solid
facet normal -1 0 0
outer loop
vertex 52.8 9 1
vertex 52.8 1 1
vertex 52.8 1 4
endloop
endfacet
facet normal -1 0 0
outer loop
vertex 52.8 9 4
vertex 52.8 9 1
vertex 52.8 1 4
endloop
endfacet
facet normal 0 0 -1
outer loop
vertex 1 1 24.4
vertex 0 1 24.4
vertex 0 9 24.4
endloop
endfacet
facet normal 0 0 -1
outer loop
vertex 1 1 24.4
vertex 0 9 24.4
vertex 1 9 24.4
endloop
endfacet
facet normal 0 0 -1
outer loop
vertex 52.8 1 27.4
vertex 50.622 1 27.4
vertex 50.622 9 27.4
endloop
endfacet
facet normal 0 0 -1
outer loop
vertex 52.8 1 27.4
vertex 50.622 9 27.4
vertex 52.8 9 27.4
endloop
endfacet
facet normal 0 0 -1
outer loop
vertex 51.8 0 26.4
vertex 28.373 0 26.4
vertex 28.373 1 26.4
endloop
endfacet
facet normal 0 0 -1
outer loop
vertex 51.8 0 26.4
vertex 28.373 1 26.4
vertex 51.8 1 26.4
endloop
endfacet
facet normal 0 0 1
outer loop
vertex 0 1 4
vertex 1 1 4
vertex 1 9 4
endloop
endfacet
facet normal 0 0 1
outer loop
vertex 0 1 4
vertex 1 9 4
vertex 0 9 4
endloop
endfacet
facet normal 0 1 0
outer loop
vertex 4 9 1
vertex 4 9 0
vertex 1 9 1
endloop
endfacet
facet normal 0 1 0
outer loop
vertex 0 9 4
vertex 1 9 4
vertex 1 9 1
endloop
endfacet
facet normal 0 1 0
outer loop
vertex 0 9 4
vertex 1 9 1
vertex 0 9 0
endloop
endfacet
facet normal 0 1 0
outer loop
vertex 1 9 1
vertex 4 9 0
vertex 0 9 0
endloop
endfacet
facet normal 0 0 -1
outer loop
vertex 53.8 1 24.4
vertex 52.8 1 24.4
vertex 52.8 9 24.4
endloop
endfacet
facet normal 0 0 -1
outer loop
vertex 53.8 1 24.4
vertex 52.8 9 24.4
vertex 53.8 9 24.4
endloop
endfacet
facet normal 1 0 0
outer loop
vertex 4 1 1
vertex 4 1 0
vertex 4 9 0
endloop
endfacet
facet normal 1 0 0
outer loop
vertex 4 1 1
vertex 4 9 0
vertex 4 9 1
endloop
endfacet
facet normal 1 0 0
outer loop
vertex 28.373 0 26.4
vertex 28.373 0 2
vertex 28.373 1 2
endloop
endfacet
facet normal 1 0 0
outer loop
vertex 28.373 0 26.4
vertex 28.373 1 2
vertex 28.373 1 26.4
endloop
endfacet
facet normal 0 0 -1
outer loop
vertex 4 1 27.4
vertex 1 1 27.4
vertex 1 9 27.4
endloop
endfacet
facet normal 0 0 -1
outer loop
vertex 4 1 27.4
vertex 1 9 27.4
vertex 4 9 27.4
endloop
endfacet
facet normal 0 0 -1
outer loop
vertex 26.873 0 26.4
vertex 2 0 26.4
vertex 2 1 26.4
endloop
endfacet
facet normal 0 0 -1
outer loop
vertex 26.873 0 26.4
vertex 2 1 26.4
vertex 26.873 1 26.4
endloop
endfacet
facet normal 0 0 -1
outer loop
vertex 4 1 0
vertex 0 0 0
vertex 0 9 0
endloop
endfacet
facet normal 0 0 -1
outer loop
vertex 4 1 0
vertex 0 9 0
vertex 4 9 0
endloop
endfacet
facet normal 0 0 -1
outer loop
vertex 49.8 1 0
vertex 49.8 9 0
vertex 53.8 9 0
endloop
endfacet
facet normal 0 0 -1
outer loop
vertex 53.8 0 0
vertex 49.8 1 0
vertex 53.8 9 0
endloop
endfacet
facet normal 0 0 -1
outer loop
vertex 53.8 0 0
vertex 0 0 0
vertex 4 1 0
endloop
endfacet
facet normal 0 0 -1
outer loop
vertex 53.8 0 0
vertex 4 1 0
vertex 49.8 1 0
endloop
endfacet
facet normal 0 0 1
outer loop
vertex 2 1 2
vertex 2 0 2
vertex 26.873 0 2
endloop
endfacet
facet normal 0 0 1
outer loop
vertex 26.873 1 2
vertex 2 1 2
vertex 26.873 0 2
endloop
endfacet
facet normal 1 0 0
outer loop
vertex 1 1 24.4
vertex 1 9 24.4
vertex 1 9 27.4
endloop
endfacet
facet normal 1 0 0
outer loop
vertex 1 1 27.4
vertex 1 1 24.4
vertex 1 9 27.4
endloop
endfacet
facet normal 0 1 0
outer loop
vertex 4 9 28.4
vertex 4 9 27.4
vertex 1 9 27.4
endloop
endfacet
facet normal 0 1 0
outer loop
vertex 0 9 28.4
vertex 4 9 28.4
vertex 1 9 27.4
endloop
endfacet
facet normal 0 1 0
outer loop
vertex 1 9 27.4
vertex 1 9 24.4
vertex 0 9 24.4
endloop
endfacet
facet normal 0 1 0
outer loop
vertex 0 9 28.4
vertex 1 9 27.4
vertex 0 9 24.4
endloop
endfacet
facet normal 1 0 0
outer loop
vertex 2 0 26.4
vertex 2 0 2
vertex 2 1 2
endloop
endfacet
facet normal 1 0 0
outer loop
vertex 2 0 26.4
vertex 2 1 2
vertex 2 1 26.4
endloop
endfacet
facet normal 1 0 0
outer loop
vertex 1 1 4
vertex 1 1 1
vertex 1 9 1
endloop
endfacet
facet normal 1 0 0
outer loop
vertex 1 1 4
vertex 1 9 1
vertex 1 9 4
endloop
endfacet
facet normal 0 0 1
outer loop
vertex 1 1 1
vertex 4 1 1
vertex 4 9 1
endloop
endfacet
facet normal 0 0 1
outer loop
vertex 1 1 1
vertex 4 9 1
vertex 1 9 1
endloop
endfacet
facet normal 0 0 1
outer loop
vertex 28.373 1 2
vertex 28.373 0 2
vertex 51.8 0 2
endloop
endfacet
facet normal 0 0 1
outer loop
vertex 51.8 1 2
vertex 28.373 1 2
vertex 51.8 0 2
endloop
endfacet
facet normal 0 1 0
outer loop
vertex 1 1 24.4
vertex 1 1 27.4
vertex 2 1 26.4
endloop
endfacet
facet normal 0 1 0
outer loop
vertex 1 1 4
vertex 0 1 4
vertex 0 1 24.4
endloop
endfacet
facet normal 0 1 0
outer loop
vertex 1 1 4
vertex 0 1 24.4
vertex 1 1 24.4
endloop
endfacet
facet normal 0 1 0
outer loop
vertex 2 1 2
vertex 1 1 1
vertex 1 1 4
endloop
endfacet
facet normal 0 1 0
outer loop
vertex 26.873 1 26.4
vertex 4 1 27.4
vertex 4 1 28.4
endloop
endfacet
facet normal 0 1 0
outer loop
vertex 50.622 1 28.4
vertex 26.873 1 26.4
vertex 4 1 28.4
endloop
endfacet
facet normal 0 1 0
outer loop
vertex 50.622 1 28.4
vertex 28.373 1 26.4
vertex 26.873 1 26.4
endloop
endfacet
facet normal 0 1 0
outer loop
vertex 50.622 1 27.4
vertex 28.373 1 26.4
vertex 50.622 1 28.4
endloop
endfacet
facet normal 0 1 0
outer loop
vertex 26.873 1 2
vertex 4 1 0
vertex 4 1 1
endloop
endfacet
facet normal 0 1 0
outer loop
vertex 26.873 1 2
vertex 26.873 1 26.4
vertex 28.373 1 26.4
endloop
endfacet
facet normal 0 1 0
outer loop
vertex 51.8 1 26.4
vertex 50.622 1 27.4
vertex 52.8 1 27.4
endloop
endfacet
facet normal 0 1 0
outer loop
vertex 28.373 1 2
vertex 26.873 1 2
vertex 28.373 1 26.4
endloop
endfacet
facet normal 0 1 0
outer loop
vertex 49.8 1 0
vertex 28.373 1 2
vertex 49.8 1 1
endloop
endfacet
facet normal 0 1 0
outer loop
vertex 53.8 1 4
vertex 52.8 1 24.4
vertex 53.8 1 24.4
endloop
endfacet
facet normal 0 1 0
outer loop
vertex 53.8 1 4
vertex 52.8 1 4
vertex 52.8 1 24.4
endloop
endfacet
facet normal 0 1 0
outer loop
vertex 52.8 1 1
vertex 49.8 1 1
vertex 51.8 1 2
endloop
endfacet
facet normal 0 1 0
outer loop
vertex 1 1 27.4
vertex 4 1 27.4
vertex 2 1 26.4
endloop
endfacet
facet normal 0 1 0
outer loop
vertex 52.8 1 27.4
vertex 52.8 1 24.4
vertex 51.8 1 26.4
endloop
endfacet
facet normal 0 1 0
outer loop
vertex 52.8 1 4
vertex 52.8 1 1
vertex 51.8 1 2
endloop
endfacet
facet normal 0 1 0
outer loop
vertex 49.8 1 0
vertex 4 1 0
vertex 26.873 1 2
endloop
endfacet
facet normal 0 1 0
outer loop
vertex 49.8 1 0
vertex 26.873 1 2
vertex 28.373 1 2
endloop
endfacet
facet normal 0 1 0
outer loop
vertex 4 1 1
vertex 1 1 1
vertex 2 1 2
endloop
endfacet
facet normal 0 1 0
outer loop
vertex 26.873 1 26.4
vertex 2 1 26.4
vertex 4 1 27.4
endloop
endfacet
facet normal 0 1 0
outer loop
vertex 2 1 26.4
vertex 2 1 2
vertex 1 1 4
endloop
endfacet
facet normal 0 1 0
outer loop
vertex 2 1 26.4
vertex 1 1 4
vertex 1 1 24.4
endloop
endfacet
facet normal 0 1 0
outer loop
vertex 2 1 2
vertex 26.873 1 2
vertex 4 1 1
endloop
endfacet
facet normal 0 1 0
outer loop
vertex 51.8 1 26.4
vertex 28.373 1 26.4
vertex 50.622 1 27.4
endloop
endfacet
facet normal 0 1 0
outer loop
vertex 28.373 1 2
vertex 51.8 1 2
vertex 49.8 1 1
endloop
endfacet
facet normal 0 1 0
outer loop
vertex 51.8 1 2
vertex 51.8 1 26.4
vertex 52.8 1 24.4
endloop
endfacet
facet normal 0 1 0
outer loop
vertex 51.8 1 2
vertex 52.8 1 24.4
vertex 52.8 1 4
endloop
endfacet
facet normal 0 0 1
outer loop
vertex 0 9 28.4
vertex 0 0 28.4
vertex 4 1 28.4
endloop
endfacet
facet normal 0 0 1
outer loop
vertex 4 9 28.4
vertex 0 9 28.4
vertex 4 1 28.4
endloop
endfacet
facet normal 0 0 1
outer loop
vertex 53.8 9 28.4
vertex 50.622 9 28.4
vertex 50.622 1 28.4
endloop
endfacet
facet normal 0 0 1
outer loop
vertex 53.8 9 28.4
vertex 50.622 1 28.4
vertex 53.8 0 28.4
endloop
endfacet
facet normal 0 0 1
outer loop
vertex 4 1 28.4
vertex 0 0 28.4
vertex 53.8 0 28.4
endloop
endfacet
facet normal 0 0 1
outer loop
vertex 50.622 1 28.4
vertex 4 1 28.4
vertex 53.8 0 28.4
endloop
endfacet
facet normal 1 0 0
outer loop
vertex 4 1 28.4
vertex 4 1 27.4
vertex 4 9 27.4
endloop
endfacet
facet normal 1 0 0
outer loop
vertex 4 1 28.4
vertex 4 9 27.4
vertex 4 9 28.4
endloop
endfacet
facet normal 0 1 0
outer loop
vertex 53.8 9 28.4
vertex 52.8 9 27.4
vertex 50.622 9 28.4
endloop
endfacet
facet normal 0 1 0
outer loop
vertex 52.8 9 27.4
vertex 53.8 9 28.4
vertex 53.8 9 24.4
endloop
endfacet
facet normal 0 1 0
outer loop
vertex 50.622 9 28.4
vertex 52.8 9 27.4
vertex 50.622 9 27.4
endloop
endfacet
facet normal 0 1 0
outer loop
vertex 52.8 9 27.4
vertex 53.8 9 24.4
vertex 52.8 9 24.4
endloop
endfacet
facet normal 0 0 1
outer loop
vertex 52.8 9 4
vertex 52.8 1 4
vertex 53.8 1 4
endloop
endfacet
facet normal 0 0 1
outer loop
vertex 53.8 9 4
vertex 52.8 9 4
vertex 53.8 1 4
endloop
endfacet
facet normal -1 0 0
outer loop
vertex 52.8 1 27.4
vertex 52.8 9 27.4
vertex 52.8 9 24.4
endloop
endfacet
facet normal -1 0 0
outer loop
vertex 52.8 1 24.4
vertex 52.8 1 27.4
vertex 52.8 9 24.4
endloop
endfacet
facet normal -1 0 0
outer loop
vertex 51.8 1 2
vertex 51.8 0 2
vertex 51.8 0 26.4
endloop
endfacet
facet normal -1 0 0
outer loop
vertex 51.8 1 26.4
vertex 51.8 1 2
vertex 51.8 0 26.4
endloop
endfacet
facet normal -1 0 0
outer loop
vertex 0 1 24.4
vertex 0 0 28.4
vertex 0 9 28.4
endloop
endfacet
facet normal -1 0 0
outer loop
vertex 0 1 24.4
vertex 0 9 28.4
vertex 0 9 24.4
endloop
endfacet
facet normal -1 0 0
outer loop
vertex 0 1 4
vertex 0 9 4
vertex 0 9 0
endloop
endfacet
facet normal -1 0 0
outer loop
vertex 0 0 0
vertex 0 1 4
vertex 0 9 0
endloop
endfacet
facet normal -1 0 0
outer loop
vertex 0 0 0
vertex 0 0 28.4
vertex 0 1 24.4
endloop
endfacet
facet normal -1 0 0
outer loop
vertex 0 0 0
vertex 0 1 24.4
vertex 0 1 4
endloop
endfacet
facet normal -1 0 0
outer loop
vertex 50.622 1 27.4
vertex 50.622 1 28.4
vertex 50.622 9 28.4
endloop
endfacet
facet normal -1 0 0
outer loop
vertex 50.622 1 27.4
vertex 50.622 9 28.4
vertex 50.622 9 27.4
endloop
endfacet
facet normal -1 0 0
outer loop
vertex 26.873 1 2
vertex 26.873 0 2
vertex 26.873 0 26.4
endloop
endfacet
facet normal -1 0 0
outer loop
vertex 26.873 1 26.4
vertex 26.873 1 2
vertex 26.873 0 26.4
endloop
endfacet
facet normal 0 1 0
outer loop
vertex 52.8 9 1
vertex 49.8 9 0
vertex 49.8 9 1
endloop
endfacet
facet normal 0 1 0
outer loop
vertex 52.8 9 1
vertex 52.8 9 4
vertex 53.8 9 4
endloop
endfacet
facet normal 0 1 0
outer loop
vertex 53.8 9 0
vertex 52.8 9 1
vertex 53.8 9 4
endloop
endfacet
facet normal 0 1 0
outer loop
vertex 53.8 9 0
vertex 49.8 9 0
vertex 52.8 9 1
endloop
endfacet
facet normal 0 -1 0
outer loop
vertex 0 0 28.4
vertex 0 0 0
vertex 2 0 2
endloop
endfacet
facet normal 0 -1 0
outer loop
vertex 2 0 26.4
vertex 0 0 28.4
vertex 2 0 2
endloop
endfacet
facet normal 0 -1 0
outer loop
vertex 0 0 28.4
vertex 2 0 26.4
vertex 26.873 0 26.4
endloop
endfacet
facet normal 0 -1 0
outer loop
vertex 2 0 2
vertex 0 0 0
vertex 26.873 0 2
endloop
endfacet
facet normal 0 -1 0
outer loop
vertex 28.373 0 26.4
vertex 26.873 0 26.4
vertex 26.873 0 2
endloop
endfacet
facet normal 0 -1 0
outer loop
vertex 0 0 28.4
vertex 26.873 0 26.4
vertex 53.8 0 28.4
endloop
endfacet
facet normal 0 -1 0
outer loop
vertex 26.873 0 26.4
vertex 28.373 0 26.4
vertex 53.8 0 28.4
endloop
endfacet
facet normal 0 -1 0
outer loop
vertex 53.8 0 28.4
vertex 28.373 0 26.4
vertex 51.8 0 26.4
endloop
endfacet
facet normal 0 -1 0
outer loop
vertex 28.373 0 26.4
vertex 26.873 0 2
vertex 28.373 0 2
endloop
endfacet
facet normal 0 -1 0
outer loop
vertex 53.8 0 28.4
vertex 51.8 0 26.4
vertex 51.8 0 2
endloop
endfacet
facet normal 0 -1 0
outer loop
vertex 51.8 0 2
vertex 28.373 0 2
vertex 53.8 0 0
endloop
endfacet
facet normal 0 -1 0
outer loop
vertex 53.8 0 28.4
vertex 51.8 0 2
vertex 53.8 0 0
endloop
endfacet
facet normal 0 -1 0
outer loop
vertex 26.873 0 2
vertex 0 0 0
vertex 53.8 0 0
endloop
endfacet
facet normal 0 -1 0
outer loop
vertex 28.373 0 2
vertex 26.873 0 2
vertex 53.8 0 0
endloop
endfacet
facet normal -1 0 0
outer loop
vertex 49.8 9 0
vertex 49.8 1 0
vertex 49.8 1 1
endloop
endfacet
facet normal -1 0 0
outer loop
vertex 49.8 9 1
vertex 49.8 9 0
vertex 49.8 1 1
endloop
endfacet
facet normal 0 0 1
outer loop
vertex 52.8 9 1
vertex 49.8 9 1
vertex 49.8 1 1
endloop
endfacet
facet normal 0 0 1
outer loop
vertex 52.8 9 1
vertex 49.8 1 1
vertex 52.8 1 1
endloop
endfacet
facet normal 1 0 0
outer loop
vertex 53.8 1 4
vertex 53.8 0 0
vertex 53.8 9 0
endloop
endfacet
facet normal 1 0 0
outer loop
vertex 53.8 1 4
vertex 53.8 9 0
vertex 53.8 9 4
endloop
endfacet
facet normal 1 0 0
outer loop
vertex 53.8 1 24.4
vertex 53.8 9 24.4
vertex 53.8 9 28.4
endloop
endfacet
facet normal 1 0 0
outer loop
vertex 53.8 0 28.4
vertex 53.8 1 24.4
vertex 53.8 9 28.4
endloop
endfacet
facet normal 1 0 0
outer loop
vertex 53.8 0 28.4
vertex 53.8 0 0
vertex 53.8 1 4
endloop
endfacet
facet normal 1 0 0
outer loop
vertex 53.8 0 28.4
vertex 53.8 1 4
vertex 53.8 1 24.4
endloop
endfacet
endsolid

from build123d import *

# Parameters (mm, degrees)
SKETCH_1_W          = 53.8
SKETCH_1_H          = 28.4
EXTRUDE_1_DEPTH     = 1
EXTRUDE_2_DEPTH     = 8
SKETCH_4_W          = 23.427026947
SKETCH_4_H          = 24.4
SKETCH_4_W_2        = 24.872973053
CUT_EXTRUDE_1_DEPTH = 62.497967446


with BuildPart() as part:
    # 草图1 → 凸台-拉伸1 (new body)
    with BuildSketch(Plane(origin=(0, 0, 0), x_dir=(1, 0, 0), z_dir=(0, 1, 0))):
        with Locations((26.9, -14.2)):
            Rectangle(SKETCH_1_W, SKETCH_1_H)
    extrude(amount=EXTRUDE_1_DEPTH)

    # 草图2 → 凸台-拉伸2 (add)
    with BuildSketch(Plane(origin=(0, 1, 0), x_dir=(1, 0, 0), z_dir=(0, 1, 0))):
        Polygon((53.8, -28.4), (53.621994937, -28.4), (50.621994937, -28.4), (50.621994937, -27.4), (52.8, -27.4), (52.8, -24.4), (53.8, -24.4), align=None)
        Polygon((53.8, 0), (52.8, 0), (49.8, 0), (49.8, -1), (52.8, -1), (52.8, -4), (53.8, -4), align=None)
        Polygon((0, -27.4), (0, -24.4), (1, -24.4), (1, -27.4), (4, -27.4), (4, -28.4), (0, -28.4), align=None)
        Polygon((0, 0), (4, 0), (4, -1), (1, -1), (1, -4), (0, -4), (0, -1), align=None)
    extrude(amount=EXTRUDE_2_DEPTH)

    # 草图4 → 切除-拉伸1 (cut, through all)
    with BuildSketch(Plane.XZ):
        with Locations((40.086486527, 14.2)):
            Rectangle(SKETCH_4_W, SKETCH_4_H)
        with Locations((14.436486527, 14.2)):
            Rectangle(SKETCH_4_W_2, SKETCH_4_H)
    extrude(amount=-CUT_EXTRUDE_1_DEPTH, mode=Mode.SUBTRACT)


solid = part.part
